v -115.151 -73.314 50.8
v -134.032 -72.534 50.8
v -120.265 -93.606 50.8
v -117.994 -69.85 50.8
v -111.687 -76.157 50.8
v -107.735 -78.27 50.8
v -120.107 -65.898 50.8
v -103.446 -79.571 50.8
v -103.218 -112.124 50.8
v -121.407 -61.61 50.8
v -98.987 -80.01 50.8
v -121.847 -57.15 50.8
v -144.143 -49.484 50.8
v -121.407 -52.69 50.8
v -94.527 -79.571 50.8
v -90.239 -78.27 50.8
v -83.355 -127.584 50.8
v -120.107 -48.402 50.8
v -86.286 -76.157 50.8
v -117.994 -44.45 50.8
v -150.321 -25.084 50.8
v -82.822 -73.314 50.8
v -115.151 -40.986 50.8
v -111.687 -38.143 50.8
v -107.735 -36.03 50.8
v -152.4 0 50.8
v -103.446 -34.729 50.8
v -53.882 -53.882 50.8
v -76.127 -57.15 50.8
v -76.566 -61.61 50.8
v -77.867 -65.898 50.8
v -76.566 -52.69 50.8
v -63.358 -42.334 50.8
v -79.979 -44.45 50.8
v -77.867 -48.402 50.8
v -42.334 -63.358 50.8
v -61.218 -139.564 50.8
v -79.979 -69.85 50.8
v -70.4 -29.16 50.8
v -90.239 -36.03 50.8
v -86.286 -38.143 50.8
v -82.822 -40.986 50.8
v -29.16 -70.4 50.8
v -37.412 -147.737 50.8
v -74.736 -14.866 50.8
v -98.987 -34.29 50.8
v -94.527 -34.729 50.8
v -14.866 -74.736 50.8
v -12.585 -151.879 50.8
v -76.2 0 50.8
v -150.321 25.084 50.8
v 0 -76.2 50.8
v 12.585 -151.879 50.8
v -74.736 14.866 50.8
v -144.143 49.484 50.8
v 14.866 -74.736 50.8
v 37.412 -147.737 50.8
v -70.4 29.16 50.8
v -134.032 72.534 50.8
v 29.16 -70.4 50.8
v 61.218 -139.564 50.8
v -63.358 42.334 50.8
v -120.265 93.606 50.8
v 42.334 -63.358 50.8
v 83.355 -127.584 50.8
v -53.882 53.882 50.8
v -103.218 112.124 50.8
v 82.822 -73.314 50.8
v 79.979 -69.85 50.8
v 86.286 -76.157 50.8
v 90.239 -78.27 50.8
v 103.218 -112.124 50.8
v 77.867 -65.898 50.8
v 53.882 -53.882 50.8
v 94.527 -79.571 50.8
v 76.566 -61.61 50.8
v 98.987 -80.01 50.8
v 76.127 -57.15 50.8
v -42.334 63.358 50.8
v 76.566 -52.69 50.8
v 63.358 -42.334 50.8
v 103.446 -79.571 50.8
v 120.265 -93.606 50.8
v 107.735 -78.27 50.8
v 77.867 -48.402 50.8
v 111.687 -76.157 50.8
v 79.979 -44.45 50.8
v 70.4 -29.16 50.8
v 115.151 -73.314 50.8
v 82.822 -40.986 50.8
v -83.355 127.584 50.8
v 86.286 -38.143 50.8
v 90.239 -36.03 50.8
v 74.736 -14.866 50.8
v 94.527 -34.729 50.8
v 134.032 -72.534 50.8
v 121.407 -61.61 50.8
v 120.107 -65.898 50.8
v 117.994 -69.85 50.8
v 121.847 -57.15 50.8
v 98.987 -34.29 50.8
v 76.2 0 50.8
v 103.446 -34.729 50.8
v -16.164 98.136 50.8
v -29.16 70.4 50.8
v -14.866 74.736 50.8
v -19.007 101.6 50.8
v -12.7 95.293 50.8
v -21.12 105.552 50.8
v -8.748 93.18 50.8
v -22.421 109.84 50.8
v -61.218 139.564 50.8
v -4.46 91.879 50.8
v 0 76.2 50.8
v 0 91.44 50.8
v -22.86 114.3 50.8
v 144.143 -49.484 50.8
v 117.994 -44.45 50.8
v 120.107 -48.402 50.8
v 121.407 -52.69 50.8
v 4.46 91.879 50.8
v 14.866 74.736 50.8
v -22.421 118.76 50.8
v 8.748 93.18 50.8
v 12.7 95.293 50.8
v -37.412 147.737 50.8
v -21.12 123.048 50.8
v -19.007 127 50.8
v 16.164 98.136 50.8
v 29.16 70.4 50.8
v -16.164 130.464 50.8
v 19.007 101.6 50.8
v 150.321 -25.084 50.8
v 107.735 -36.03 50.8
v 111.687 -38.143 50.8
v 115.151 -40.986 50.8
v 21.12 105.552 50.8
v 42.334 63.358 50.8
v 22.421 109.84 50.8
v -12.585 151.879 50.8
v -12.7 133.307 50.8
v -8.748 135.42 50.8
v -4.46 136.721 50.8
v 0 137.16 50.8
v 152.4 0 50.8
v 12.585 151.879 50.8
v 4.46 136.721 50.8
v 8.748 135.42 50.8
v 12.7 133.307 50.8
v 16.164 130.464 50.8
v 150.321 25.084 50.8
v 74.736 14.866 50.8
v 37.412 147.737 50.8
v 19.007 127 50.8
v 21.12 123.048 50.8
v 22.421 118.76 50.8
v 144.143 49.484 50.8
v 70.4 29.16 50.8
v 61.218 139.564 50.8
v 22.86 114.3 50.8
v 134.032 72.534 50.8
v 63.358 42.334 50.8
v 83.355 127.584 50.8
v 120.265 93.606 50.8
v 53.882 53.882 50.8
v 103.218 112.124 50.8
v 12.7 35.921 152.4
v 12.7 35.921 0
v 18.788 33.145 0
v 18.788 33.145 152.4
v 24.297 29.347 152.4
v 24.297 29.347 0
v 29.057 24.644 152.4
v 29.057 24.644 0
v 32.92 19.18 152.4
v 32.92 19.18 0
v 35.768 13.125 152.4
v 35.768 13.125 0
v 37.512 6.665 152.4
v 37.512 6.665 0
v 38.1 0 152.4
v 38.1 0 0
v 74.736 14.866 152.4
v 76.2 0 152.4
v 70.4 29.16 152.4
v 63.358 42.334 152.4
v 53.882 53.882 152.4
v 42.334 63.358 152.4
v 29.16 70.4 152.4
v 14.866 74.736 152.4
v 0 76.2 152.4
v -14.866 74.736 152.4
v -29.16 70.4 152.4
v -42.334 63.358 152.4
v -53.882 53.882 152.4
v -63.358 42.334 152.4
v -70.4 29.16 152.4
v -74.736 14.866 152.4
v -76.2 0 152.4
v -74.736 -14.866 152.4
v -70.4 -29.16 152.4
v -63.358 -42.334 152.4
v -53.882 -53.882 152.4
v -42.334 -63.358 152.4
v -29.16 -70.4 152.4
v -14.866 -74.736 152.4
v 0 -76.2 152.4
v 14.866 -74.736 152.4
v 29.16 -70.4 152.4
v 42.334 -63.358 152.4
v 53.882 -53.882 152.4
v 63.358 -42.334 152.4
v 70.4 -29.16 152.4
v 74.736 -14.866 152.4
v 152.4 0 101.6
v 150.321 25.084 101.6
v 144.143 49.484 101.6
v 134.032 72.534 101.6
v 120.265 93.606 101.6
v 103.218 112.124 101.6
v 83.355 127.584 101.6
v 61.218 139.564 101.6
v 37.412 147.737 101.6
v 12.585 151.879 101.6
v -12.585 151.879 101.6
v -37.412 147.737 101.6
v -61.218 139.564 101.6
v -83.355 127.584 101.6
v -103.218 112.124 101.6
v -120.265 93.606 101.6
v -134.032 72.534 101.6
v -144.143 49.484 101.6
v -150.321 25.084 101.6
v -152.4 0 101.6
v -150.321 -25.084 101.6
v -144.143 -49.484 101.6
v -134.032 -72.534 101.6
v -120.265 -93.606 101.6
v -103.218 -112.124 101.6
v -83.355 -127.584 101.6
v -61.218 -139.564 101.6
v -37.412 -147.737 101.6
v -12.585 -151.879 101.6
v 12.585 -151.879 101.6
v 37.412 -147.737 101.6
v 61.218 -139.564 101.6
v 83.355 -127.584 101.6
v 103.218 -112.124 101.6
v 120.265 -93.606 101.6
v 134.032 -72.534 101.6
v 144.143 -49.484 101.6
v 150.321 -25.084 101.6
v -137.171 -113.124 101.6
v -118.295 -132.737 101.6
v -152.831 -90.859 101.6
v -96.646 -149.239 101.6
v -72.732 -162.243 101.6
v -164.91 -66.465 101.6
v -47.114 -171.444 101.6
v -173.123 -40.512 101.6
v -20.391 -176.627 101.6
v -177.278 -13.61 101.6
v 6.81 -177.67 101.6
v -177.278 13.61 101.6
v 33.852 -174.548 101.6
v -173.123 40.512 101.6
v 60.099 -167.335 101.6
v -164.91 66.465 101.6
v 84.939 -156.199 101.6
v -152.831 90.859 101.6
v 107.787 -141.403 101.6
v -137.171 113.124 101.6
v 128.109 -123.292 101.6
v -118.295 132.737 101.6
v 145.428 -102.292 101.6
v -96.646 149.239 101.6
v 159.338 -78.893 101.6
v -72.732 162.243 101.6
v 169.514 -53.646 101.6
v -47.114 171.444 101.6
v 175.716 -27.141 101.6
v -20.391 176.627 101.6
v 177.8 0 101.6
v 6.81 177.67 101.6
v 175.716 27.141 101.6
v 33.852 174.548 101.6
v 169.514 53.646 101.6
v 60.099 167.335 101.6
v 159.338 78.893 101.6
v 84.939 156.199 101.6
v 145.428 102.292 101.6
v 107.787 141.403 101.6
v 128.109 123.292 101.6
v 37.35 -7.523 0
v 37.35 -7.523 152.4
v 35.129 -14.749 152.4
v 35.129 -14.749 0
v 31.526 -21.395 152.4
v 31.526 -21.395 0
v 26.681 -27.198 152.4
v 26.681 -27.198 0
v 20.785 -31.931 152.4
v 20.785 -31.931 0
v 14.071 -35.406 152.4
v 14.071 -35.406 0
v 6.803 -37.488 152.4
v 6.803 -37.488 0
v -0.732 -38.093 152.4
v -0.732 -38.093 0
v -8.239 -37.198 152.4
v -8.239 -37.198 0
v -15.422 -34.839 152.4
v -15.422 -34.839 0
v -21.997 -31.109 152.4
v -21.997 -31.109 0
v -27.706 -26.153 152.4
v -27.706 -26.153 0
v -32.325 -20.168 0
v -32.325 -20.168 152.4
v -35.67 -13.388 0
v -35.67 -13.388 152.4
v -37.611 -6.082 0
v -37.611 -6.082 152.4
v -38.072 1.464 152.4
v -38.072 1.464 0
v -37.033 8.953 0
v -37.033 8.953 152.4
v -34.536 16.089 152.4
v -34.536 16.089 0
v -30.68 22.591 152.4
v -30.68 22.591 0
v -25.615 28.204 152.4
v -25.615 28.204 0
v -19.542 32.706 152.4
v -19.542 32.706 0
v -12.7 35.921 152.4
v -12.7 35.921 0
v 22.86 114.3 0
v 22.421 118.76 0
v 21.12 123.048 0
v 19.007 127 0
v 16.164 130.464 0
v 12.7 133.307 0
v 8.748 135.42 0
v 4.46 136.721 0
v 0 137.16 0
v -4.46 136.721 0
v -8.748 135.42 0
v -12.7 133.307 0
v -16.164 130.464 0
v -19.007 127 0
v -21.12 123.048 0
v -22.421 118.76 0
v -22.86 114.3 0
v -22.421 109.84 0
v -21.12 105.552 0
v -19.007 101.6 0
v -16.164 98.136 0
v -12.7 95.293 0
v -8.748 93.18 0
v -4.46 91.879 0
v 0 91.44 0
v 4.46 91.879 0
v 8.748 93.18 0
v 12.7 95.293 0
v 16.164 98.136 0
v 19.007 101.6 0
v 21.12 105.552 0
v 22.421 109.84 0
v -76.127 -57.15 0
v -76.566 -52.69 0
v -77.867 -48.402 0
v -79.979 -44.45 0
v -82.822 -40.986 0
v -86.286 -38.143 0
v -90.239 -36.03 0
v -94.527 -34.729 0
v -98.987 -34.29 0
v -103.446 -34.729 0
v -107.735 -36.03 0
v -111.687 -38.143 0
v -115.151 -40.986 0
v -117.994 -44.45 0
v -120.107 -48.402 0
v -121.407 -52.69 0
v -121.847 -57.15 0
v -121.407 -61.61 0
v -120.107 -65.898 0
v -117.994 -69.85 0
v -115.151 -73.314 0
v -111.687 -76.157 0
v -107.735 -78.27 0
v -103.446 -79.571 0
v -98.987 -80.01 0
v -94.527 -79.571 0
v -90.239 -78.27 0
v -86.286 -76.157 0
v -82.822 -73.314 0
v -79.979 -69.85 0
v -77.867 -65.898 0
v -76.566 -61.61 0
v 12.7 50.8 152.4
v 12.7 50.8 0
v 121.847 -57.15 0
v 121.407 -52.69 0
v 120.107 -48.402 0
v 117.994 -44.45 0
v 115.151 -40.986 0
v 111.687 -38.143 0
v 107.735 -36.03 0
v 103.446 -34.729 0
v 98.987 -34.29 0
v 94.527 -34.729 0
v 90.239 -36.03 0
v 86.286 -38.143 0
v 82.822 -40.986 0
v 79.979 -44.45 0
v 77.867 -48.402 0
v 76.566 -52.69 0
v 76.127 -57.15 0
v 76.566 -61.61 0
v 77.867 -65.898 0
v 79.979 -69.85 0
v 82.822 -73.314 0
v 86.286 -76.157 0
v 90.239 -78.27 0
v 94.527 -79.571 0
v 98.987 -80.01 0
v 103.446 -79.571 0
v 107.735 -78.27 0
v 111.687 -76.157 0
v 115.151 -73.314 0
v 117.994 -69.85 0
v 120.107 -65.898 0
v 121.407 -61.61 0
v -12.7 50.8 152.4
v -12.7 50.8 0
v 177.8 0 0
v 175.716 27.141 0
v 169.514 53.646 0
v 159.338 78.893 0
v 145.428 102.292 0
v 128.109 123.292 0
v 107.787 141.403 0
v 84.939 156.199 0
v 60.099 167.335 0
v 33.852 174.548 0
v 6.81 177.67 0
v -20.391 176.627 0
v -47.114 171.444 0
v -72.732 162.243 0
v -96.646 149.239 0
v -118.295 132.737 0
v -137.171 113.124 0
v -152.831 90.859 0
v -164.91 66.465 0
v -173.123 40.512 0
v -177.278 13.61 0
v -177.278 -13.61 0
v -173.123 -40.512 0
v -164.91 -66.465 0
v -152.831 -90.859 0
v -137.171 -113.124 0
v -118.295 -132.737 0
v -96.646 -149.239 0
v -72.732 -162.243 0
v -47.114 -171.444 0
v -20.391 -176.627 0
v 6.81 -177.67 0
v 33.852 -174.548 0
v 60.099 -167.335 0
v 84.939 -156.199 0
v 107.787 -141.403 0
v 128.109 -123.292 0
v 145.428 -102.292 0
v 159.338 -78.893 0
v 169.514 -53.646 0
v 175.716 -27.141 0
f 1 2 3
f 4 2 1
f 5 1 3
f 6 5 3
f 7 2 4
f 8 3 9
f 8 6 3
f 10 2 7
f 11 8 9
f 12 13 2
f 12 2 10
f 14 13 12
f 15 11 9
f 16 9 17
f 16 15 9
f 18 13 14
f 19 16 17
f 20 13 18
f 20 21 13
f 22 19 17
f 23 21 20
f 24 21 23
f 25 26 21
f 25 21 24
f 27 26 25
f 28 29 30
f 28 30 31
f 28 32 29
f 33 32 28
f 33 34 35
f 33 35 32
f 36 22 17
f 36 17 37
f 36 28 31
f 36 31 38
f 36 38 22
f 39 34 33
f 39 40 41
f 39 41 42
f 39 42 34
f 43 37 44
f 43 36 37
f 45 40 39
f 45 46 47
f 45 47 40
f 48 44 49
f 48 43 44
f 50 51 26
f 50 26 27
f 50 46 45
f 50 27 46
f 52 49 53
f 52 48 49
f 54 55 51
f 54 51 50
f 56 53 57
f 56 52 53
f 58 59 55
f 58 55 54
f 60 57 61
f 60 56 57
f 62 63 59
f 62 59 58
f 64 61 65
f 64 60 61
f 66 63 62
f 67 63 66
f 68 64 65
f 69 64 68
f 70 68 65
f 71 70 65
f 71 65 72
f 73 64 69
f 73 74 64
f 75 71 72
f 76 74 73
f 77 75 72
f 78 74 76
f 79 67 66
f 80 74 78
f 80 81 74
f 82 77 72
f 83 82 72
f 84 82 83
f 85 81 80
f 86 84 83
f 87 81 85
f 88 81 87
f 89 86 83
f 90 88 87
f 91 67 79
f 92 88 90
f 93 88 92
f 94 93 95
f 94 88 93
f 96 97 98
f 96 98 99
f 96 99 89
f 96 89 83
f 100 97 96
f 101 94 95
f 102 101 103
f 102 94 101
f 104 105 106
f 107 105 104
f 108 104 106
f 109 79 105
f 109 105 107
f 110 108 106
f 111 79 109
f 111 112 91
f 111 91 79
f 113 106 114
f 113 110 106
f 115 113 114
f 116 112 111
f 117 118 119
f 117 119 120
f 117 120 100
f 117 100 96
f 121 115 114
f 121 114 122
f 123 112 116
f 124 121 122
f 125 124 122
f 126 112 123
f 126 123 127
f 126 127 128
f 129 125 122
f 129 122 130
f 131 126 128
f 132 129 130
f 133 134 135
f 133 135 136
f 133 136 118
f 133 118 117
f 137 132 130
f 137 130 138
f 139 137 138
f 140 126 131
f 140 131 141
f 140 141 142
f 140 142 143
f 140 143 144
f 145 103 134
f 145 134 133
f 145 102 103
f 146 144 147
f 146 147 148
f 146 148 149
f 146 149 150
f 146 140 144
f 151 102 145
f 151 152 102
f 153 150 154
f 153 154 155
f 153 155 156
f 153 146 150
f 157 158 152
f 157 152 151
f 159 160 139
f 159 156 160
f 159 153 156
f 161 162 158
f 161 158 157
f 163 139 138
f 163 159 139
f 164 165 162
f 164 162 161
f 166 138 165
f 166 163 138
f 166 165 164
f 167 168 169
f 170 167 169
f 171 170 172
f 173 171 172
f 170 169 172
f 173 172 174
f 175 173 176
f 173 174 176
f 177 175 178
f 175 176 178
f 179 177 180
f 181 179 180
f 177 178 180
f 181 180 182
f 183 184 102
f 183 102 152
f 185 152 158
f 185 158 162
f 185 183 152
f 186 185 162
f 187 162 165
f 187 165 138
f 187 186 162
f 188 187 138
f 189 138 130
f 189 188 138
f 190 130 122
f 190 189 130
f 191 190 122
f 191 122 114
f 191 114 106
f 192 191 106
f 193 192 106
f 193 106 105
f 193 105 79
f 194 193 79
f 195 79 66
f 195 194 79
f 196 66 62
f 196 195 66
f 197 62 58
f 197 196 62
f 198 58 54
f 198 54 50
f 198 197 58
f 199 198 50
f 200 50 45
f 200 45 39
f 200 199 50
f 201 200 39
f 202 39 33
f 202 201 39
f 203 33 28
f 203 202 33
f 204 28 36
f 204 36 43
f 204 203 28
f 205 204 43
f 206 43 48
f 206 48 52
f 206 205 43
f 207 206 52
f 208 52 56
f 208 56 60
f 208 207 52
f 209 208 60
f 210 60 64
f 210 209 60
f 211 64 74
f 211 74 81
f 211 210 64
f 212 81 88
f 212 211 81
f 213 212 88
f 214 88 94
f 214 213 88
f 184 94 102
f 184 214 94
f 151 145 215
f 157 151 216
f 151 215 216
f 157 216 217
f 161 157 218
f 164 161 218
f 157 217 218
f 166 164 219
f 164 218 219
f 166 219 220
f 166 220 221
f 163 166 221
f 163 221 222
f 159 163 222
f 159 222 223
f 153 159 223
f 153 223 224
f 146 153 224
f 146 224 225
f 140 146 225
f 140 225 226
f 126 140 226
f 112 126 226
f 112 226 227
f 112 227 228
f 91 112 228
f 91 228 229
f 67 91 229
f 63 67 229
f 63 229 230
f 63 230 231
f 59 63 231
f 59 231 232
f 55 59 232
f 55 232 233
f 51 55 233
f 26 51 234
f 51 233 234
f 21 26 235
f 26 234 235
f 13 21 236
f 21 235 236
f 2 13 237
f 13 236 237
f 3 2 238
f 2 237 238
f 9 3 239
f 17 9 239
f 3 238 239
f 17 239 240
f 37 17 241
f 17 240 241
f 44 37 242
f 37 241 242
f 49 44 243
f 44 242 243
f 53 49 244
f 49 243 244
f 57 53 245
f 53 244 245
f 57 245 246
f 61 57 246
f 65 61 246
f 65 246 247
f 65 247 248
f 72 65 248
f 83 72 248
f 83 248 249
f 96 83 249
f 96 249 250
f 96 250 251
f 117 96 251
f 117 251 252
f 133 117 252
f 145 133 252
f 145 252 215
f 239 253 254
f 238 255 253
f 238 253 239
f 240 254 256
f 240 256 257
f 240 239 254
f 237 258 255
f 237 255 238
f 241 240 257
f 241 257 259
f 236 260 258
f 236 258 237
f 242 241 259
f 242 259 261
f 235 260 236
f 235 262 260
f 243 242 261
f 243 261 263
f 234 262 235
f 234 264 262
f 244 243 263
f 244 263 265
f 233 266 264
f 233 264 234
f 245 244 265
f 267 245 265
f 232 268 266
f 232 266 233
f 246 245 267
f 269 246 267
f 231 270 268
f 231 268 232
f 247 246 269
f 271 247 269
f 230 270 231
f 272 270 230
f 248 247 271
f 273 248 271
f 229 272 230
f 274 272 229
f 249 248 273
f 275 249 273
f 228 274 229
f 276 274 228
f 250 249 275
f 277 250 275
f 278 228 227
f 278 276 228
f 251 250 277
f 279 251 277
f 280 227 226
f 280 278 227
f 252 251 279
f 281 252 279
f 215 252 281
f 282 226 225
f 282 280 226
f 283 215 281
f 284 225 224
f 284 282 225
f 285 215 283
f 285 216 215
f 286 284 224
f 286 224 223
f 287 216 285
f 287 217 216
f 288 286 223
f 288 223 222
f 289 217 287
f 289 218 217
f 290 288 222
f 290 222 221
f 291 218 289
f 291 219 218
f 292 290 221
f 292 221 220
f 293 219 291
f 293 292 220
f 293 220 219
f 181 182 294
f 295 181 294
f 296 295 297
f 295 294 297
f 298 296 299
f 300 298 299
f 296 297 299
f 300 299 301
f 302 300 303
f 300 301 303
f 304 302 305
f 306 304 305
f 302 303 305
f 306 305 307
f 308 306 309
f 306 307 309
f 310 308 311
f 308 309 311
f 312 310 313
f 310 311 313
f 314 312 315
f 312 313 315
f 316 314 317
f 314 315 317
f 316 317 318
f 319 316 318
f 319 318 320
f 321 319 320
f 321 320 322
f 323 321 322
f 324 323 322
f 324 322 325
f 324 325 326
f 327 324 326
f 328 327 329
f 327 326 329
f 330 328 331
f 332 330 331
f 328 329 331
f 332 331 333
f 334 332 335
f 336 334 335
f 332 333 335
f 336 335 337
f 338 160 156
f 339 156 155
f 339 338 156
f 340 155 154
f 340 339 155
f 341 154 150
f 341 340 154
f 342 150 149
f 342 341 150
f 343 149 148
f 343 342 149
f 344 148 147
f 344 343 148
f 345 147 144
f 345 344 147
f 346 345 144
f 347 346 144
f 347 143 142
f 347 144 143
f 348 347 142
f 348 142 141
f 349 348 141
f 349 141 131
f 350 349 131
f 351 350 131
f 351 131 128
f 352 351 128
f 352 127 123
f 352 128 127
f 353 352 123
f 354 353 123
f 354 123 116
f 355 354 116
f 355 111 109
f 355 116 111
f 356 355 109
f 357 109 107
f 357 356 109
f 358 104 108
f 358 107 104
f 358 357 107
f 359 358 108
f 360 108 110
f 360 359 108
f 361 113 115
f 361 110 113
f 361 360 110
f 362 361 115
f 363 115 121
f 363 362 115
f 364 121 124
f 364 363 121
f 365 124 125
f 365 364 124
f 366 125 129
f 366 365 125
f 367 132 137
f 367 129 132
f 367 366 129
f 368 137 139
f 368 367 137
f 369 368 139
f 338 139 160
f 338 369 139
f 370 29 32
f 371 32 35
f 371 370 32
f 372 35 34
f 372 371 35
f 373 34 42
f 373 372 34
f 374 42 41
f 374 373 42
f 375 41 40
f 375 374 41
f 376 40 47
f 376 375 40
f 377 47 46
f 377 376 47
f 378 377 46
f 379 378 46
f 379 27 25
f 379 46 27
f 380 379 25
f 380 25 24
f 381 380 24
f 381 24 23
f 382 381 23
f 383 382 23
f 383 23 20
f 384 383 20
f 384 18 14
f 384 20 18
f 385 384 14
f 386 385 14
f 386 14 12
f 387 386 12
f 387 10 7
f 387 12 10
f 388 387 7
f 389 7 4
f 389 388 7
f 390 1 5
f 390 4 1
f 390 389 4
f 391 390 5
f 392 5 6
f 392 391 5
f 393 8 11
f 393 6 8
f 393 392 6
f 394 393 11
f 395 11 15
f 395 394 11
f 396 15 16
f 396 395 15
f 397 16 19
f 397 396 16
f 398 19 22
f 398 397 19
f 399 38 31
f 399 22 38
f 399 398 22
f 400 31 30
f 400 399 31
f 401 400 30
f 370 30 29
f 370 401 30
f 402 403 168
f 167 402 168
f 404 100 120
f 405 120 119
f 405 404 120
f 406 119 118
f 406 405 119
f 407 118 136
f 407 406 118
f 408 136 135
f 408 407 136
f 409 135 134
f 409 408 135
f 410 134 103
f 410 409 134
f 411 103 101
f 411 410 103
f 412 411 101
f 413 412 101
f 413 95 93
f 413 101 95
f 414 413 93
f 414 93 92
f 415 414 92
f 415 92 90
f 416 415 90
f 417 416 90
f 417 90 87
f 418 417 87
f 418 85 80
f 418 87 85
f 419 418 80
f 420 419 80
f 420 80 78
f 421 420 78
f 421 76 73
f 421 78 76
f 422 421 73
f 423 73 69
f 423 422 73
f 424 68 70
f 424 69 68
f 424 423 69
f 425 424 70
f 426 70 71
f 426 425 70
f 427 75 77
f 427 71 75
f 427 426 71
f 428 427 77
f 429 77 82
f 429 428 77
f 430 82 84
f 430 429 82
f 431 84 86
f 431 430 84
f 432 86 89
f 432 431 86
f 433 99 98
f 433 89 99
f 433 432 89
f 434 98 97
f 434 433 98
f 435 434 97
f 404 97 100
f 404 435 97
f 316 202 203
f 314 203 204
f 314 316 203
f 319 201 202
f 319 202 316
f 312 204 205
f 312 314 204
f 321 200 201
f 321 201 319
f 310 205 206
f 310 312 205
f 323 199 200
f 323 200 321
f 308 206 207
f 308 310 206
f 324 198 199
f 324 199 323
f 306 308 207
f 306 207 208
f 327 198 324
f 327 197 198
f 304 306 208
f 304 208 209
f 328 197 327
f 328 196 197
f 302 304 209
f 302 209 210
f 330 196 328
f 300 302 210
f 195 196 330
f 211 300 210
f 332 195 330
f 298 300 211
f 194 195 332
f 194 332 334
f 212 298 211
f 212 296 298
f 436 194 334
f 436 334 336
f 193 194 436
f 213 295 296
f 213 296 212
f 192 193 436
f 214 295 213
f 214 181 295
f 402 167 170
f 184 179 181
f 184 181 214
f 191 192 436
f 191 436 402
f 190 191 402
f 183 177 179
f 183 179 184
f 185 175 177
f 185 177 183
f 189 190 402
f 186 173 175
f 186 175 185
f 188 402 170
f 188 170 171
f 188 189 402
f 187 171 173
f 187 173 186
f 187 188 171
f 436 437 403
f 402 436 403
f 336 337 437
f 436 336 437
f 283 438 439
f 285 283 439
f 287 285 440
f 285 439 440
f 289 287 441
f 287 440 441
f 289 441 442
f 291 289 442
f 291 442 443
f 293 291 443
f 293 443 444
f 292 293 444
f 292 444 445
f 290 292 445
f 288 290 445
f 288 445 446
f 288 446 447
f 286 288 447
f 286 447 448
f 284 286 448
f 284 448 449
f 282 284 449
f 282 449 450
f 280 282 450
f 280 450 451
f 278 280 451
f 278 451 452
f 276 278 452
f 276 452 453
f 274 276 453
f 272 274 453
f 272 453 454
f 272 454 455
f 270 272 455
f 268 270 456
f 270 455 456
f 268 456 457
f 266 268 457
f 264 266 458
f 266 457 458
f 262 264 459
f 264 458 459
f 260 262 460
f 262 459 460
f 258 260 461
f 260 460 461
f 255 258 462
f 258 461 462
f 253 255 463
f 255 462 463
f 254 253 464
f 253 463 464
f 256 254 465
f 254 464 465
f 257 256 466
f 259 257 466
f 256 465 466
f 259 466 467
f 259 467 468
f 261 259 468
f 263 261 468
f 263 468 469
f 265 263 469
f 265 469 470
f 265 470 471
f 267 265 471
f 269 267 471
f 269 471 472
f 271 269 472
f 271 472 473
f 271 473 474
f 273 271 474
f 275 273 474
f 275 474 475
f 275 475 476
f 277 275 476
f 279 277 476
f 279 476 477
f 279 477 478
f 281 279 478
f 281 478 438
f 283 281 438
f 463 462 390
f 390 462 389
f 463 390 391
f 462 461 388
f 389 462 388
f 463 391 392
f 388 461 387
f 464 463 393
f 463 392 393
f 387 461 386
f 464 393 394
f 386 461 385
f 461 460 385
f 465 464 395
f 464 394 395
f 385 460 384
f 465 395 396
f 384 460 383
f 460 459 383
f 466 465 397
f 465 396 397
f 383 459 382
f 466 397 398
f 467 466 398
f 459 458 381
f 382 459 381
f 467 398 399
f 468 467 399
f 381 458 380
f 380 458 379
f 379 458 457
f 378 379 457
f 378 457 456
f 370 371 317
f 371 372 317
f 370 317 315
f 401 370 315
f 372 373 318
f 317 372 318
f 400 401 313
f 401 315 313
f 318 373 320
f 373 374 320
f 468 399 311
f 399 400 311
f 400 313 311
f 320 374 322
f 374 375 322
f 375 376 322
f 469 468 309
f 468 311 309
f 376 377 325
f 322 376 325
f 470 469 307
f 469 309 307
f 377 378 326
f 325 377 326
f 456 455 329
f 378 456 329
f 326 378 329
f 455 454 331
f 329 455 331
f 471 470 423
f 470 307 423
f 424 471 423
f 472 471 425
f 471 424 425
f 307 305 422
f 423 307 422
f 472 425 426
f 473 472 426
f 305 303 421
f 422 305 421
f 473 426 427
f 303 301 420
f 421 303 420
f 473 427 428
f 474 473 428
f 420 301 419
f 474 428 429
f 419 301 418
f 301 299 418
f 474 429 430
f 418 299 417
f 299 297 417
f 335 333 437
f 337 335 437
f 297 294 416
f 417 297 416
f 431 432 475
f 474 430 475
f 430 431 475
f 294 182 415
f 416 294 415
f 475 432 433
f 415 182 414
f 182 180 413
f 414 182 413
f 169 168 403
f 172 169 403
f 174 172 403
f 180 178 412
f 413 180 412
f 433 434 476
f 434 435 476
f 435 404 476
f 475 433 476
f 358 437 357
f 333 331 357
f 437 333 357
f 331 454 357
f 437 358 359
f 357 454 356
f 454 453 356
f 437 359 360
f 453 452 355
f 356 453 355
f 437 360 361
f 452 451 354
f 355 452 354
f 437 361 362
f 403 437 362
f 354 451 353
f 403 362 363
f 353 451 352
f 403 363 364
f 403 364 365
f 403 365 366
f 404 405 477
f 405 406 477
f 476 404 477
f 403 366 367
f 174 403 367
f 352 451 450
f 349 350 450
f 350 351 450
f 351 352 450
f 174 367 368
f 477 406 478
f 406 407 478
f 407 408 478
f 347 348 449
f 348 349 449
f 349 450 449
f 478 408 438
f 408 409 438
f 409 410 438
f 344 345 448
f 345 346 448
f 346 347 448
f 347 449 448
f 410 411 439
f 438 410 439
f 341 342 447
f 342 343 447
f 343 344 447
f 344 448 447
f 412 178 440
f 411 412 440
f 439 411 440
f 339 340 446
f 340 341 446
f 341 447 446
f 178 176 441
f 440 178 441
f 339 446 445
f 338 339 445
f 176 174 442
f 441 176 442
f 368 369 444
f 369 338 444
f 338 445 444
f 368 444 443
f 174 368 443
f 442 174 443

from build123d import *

# Parameters (mm, degrees)
F0_R     = 177.8
F0_R_2   = 22.86
F1_DEPTH = 152.4
F2_R     = 152.4
F2_R_2   = 76.2
F3_DEPTH = 101.6
F4_R     = 177.8
F4_R_2   = 152.4
F5_DEPTH = 50.8


with BuildPart() as f1:
    # F0 (on Top) → F1 (new body)
    with BuildSketch(Plane.XY):
        Circle(F0_R)
        with Locations((-98.986704, -57.15)):
            Circle(F0_R_2, mode=Mode.SUBTRACT)
        with Locations((98.986704, -57.15)):
            Circle(F0_R_2, mode=Mode.SUBTRACT)
        with BuildLine():
            ThreePointArc((12.7, 35.921024), (31.10852, 21.997045), (38.1, 0))
            ThreePointArc((38.1, 0), (-21.997045, -31.10852), (-12.7, 35.921024))
            Line((-12.7, 35.921024), (-12.7, 50.8))
            Line((-12.7, 50.8), (12.7, 50.8))
            Line((12.7, 50.8), (12.7, 35.921024))
        make_face(mode=Mode.SUBTRACT)
        with Locations((0, 114.3)):
            Circle(F0_R_2, mode=Mode.SUBTRACT)
    extrude(amount=F1_DEPTH)

    # F2 (on face) → F3 (cut)
    with BuildSketch(Plane.XY.offset(152.4)):
        Circle(F2_R)
        Circle(F2_R_2, mode=Mode.SUBTRACT)
    extrude(amount=-F3_DEPTH, mode=Mode.SUBTRACT)

    # F4 (on face) → F5 (cut)
    with BuildSketch(Plane.XY.offset(152.4)):
        Circle(F4_R)
        Circle(F4_R_2, mode=Mode.SUBTRACT)
    extrude(amount=-F5_DEPTH, mode=Mode.SUBTRACT)


solid = f1.part
